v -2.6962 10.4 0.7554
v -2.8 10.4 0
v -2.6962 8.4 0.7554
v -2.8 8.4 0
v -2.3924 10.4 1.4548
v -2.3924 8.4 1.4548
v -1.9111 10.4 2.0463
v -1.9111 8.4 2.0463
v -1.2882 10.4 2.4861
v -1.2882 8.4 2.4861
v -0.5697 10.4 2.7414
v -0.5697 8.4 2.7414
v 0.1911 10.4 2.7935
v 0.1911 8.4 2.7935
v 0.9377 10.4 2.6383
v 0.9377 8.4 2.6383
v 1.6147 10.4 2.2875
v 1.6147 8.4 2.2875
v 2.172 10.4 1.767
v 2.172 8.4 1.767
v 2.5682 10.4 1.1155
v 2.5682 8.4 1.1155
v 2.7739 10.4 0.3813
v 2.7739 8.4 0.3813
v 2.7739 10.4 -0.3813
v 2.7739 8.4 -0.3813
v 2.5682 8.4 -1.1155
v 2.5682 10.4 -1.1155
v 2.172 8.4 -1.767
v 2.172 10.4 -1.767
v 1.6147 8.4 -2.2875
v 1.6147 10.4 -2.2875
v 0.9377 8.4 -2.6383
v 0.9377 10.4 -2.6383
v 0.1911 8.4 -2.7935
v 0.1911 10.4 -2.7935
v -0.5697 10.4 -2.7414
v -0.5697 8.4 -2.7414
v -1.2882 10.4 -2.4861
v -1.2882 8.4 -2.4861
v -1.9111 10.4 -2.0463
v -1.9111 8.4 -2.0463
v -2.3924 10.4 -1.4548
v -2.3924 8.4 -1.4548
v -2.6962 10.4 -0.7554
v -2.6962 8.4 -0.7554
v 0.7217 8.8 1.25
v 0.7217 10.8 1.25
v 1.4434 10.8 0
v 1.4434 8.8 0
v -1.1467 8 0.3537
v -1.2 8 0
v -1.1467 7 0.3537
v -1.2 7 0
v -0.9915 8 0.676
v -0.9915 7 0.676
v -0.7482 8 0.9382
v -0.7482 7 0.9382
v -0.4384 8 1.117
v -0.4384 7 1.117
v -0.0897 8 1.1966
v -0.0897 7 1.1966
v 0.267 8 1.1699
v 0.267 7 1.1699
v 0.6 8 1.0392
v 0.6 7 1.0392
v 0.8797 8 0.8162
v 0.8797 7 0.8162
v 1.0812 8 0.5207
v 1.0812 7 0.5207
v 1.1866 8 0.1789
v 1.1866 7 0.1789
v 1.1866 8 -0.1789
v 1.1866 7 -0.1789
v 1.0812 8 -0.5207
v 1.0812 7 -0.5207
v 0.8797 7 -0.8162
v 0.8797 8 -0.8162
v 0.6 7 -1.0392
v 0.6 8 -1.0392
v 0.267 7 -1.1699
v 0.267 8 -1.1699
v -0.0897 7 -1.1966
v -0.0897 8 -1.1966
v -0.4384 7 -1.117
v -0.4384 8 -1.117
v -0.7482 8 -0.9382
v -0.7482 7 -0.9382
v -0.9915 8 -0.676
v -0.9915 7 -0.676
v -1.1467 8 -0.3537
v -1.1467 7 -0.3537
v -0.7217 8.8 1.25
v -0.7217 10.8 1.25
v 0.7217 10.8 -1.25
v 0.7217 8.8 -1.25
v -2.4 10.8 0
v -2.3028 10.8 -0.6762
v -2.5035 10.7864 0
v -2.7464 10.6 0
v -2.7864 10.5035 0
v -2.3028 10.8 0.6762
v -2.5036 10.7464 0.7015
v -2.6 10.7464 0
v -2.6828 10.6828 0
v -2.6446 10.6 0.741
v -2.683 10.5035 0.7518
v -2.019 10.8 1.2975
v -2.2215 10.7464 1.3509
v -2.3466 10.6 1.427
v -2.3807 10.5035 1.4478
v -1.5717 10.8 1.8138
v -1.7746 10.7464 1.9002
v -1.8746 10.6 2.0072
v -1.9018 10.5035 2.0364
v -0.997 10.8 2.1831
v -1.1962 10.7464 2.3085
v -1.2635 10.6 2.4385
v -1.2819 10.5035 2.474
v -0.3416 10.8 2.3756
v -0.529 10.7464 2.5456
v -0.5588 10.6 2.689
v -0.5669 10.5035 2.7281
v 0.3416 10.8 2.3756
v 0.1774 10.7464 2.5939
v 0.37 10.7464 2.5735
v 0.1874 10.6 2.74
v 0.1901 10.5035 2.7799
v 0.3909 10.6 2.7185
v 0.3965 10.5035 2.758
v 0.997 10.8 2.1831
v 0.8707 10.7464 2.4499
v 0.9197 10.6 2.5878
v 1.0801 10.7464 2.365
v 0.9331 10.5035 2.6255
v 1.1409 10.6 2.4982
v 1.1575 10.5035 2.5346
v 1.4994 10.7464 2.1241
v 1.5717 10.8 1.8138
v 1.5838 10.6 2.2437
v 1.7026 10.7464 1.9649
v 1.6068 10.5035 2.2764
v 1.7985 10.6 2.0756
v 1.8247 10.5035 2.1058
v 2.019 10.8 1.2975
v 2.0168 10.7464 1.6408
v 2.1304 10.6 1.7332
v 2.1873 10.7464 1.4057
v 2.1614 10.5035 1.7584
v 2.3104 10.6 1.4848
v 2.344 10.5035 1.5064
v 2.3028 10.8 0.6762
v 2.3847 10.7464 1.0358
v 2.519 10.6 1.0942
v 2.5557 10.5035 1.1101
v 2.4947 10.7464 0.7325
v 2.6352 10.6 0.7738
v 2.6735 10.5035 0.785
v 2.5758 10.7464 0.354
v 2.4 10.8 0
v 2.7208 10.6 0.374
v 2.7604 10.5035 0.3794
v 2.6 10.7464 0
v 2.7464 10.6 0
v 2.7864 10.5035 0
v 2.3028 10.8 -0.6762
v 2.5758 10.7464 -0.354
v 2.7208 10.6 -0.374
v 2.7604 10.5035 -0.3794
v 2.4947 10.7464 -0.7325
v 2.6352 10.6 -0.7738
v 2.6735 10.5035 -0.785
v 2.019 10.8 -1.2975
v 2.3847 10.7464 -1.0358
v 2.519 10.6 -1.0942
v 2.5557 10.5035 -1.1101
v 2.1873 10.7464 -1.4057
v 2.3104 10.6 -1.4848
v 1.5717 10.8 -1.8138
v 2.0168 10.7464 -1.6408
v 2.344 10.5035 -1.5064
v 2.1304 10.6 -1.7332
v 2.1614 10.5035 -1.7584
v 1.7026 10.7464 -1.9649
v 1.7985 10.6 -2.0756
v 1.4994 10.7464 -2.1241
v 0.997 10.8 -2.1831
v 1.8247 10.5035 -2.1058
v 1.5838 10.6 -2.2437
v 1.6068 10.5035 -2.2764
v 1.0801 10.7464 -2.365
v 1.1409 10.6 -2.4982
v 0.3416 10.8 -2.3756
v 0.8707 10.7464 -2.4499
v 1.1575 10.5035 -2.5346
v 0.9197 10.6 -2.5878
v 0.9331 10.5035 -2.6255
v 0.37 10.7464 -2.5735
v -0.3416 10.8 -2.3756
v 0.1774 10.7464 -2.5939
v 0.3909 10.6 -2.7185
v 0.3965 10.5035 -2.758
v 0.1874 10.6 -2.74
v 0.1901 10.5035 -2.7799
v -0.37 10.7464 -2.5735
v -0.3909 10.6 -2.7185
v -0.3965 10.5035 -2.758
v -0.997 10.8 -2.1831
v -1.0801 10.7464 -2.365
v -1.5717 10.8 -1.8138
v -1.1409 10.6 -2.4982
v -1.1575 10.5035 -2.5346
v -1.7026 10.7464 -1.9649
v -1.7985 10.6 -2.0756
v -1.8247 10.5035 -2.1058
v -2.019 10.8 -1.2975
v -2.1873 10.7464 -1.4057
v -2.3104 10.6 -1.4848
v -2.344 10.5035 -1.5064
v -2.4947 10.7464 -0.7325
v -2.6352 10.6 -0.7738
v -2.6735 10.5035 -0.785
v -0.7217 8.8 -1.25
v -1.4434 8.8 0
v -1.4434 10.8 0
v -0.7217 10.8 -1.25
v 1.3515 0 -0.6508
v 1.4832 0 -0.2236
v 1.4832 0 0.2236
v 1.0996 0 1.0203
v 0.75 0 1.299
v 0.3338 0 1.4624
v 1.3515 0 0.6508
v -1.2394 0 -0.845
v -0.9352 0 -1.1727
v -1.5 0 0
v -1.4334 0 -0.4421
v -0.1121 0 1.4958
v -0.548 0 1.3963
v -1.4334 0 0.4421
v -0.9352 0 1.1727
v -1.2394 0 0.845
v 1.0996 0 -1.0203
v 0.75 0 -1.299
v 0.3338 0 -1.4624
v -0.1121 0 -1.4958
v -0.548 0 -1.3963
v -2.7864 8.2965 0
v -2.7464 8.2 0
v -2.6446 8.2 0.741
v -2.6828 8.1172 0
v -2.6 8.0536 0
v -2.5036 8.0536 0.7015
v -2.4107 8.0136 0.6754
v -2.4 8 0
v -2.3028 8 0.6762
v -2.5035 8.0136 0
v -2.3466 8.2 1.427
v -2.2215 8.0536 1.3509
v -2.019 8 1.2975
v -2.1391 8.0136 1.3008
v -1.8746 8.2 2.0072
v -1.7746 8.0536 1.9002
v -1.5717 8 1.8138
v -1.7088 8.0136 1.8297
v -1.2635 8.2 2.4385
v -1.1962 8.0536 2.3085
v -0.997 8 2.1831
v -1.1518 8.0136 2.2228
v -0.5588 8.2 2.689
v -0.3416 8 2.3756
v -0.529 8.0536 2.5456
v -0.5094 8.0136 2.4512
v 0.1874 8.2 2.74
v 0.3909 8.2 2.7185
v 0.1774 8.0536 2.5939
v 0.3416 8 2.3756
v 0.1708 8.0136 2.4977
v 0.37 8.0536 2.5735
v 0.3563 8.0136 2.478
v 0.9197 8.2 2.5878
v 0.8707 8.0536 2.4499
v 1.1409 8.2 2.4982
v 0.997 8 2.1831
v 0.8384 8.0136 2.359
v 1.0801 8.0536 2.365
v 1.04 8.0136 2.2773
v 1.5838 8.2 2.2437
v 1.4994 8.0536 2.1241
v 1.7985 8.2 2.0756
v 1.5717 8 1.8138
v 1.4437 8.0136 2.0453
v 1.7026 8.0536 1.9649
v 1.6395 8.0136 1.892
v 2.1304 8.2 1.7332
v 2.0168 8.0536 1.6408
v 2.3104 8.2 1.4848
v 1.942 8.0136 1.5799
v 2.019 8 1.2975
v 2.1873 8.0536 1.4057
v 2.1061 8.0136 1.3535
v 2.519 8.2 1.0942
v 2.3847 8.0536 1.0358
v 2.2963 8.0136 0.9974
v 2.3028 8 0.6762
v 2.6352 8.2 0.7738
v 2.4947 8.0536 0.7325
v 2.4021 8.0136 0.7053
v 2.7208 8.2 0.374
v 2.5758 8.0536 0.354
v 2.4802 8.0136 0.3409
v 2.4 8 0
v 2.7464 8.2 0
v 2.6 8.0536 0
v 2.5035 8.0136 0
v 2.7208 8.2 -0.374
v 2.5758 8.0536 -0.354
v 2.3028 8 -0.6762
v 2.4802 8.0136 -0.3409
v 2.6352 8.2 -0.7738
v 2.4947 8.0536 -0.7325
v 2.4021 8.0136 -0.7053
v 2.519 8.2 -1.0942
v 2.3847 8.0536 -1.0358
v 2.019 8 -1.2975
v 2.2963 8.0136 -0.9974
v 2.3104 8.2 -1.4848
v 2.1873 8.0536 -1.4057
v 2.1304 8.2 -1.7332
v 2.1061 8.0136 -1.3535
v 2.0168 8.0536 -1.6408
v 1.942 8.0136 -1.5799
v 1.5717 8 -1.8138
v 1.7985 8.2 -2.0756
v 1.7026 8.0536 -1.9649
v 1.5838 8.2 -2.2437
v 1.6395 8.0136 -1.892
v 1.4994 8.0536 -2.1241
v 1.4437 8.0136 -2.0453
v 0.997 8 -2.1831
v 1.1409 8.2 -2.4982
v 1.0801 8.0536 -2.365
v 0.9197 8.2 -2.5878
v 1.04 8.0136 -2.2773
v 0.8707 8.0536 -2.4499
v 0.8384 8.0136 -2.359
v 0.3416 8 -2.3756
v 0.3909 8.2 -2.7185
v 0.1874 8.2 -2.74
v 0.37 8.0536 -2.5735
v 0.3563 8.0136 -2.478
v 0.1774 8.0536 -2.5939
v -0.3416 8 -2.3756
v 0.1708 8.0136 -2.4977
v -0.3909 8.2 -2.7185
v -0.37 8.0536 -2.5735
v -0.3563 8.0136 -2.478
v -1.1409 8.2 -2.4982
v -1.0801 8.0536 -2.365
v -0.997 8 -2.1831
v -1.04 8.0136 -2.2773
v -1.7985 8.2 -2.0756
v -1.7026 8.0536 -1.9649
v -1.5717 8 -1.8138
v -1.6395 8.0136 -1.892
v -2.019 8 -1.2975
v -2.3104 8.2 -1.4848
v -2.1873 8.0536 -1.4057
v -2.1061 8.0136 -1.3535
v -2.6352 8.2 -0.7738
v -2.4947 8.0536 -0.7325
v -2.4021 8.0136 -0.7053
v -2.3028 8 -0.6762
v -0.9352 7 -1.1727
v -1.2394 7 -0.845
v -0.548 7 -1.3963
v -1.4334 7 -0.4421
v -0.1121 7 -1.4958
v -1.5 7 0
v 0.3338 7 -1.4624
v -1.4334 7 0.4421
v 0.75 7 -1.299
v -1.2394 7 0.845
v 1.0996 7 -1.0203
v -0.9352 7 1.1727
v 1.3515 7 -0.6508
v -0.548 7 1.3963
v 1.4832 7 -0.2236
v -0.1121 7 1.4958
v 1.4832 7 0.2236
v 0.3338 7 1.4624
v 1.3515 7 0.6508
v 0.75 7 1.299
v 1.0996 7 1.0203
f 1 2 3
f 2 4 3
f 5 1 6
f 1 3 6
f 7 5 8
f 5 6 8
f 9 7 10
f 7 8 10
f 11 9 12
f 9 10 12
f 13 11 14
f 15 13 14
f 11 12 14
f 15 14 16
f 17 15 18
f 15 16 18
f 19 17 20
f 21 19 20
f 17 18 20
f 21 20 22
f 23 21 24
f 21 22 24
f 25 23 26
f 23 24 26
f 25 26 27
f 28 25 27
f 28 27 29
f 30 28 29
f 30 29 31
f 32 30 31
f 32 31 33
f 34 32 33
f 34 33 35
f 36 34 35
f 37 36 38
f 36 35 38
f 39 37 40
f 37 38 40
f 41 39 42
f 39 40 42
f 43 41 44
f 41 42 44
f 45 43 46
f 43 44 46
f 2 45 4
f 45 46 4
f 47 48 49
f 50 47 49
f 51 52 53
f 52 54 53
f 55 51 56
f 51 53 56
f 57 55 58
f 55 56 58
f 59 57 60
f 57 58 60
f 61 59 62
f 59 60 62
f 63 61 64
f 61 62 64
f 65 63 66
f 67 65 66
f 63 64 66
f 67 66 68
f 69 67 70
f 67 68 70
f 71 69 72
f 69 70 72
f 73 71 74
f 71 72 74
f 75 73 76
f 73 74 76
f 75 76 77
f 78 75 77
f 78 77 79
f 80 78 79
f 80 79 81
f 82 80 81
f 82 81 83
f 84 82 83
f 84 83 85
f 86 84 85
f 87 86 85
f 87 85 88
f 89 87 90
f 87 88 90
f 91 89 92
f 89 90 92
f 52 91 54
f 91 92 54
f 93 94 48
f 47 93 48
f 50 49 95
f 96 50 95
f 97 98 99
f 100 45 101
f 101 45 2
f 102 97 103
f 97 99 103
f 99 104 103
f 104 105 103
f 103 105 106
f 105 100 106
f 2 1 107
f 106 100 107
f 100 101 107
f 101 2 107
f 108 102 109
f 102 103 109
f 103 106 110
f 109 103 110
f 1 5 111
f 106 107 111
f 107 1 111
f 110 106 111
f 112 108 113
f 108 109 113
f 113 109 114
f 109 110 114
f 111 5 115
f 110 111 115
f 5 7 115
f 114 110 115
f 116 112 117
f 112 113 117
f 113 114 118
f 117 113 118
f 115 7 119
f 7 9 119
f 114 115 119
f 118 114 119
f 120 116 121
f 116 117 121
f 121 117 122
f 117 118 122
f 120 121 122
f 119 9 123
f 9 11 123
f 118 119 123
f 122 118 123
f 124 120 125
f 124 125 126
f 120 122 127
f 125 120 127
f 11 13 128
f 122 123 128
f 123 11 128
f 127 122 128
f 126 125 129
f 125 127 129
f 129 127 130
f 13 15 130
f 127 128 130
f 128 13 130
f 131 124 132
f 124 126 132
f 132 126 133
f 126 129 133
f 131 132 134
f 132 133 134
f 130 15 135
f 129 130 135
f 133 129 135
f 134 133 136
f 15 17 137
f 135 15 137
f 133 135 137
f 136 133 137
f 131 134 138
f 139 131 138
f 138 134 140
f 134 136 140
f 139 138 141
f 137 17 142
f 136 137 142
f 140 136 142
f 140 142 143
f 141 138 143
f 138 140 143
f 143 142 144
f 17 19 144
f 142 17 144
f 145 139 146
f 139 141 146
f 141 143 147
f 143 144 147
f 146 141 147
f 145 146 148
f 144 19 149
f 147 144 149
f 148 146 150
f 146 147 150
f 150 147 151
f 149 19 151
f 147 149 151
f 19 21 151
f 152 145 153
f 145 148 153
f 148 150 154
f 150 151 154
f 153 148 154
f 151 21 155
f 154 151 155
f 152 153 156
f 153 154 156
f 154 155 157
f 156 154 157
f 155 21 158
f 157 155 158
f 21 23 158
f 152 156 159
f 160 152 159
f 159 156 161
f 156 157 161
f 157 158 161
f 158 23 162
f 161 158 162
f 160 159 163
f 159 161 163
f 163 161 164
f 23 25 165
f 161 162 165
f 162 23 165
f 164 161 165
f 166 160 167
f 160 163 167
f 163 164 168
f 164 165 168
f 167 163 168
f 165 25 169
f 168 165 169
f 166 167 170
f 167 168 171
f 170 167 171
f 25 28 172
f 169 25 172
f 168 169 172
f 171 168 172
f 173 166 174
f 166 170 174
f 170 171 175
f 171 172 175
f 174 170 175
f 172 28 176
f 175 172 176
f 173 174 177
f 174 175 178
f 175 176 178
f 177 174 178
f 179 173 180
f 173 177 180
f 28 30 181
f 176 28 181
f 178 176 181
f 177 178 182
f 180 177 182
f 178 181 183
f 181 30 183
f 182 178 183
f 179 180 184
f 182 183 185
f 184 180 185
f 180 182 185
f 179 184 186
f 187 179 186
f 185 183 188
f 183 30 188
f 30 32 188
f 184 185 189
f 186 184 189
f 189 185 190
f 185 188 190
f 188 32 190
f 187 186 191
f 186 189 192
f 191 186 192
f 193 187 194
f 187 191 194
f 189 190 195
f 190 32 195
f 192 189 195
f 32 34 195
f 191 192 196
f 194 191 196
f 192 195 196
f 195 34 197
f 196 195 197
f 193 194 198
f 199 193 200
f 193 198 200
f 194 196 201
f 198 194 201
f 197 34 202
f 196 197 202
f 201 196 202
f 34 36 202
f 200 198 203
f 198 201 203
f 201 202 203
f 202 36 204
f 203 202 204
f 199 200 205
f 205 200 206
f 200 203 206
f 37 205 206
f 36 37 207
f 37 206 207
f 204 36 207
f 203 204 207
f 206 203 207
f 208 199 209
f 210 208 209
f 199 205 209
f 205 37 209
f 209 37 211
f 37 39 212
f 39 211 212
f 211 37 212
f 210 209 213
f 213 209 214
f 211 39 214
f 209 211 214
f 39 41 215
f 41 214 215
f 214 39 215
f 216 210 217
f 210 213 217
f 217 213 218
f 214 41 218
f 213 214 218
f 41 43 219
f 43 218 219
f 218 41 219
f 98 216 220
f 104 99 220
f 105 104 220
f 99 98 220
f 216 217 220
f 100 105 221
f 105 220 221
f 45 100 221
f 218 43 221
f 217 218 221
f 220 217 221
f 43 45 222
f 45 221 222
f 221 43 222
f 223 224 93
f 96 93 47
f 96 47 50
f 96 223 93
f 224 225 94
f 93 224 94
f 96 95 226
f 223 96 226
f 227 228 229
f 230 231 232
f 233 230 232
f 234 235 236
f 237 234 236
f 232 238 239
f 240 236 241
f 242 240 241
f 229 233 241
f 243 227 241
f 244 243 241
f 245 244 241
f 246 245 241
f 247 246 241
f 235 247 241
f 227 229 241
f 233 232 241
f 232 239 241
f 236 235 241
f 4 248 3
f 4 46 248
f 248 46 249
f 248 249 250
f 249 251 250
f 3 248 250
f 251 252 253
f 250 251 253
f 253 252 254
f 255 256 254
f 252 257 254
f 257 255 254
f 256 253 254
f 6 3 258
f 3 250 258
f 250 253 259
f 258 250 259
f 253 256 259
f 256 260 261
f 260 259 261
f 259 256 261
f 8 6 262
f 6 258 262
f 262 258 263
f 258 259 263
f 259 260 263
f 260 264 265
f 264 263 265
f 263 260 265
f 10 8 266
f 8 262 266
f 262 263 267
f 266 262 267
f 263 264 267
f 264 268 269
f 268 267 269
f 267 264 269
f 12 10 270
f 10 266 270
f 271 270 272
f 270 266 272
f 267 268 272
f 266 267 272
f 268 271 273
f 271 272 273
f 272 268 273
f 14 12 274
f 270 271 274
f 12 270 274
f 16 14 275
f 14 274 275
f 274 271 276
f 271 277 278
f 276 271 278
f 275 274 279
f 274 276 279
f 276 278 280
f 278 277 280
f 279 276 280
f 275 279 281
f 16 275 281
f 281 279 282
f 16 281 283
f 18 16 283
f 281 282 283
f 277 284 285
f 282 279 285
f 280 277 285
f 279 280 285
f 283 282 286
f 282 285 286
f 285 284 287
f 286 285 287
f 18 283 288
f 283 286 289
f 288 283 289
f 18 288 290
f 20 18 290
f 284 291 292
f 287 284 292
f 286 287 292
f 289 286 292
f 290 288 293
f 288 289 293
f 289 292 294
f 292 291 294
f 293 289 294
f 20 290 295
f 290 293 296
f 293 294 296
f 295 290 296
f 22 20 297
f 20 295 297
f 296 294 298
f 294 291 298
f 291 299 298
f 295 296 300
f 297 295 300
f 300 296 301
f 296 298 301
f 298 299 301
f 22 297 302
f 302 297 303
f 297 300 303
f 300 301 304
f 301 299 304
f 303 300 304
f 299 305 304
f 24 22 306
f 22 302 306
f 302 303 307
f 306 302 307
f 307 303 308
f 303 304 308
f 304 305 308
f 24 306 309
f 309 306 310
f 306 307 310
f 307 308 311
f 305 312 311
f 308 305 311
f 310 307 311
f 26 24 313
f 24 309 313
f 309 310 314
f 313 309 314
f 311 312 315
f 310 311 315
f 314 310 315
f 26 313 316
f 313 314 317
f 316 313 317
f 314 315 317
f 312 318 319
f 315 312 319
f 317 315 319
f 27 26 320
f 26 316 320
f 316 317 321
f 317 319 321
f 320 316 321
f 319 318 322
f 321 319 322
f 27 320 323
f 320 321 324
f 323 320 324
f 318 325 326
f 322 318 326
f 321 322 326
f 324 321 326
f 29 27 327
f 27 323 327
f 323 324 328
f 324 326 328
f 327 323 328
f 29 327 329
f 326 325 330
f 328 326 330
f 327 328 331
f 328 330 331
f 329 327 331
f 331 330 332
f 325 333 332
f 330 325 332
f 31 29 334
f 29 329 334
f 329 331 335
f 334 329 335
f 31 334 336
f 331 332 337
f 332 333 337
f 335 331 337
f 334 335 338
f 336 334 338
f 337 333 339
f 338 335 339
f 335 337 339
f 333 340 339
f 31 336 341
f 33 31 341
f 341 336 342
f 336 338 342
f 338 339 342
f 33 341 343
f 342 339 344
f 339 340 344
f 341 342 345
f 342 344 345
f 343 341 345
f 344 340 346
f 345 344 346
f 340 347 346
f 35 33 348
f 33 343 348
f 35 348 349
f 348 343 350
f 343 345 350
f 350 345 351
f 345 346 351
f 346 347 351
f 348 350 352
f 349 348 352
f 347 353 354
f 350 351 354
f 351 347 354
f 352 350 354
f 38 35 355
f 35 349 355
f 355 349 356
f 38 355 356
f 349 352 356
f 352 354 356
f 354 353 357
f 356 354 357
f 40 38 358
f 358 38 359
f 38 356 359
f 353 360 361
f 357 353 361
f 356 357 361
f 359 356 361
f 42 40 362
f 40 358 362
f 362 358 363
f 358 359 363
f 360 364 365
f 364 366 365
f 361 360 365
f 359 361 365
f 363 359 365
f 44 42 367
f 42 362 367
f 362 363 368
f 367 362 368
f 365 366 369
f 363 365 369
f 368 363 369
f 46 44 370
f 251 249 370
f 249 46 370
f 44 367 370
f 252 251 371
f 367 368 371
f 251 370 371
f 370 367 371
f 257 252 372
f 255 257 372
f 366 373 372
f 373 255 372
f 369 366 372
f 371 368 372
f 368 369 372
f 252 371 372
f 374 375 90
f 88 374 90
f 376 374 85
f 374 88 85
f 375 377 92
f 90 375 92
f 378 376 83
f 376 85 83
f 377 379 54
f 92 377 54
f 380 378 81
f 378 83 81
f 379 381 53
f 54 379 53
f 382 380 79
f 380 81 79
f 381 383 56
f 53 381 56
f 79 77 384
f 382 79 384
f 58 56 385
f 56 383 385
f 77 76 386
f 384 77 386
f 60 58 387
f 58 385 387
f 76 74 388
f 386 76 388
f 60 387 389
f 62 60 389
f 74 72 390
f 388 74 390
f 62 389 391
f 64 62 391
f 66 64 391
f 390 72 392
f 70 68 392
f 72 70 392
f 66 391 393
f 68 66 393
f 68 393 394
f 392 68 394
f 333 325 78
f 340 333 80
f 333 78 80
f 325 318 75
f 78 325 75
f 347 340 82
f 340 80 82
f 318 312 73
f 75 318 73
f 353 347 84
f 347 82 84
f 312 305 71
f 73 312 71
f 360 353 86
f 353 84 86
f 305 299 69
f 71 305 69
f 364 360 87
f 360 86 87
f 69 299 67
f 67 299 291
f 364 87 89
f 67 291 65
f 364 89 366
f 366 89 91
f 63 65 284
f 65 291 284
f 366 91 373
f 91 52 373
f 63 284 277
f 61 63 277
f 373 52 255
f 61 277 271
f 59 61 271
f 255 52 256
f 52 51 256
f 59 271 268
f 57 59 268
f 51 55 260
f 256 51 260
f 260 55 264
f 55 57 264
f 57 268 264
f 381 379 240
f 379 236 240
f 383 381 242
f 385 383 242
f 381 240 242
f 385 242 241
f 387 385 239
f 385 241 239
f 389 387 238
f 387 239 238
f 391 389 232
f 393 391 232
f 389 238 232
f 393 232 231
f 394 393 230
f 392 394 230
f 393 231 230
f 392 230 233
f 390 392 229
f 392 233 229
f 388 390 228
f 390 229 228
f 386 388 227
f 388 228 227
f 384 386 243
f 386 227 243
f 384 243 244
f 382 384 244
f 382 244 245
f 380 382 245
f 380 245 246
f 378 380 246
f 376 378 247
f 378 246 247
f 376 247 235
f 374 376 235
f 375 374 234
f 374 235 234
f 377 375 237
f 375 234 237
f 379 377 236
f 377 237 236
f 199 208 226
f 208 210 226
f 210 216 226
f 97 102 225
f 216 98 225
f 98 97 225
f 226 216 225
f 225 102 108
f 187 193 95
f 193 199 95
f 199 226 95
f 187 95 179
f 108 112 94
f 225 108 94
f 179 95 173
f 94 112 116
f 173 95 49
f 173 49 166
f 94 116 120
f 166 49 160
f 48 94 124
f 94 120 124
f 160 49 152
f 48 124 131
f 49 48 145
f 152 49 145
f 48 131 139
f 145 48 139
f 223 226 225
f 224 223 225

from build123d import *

# Parameters (mm, degrees)
CUT_EXTRUDE_1_DEPTH = 2


with BuildPart() as part:
    # 草图1 → 旋转1 (revolve)
    with BuildSketch(Plane.XY):
        with BuildLine():
            Line((0, 10.8), (-2.4, 10.8))
            ThreePointArc((-2.4, 10.8), (-2.682842712, 10.682842712), (-2.8, 10.4))
            Line((-2.8, 10.4), (-2.8, 8.4))
            ThreePointArc((-2.8, 8.4), (-2.682842712, 8.117157288), (-2.4, 8))
            Line((-2.4, 8), (-1.2, 8))
            Line((-1.2, 8), (-1.2, 7))
            Line((-1.2, 7), (-1.5, 7))
            Line((-1.5, 7), (-1.5, 0))
            Line((-1.5, 0), (0, 0))
            Line((0, 0), (0, 10.8))
        make_face()
    revolve(axis=Axis((0, 0, 0), (0, 1, 0)))

    # 草图2 → 切除-拉伸1 (cut)
    with BuildSketch(Plane(origin=(0, 10.8, 0), x_dir=(1, 0, 0), z_dir=(0, 1, 0))):
        Polygon((-0.721687836, 1.25), (-1.443375673, 0), (-0.721687836, -1.25), (0.721687836, -1.25), (1.443375673, 0), (0.721687836, 1.25), align=None)
    extrude(amount=-CUT_EXTRUDE_1_DEPTH, mode=Mode.SUBTRACT)


solid = part.part
